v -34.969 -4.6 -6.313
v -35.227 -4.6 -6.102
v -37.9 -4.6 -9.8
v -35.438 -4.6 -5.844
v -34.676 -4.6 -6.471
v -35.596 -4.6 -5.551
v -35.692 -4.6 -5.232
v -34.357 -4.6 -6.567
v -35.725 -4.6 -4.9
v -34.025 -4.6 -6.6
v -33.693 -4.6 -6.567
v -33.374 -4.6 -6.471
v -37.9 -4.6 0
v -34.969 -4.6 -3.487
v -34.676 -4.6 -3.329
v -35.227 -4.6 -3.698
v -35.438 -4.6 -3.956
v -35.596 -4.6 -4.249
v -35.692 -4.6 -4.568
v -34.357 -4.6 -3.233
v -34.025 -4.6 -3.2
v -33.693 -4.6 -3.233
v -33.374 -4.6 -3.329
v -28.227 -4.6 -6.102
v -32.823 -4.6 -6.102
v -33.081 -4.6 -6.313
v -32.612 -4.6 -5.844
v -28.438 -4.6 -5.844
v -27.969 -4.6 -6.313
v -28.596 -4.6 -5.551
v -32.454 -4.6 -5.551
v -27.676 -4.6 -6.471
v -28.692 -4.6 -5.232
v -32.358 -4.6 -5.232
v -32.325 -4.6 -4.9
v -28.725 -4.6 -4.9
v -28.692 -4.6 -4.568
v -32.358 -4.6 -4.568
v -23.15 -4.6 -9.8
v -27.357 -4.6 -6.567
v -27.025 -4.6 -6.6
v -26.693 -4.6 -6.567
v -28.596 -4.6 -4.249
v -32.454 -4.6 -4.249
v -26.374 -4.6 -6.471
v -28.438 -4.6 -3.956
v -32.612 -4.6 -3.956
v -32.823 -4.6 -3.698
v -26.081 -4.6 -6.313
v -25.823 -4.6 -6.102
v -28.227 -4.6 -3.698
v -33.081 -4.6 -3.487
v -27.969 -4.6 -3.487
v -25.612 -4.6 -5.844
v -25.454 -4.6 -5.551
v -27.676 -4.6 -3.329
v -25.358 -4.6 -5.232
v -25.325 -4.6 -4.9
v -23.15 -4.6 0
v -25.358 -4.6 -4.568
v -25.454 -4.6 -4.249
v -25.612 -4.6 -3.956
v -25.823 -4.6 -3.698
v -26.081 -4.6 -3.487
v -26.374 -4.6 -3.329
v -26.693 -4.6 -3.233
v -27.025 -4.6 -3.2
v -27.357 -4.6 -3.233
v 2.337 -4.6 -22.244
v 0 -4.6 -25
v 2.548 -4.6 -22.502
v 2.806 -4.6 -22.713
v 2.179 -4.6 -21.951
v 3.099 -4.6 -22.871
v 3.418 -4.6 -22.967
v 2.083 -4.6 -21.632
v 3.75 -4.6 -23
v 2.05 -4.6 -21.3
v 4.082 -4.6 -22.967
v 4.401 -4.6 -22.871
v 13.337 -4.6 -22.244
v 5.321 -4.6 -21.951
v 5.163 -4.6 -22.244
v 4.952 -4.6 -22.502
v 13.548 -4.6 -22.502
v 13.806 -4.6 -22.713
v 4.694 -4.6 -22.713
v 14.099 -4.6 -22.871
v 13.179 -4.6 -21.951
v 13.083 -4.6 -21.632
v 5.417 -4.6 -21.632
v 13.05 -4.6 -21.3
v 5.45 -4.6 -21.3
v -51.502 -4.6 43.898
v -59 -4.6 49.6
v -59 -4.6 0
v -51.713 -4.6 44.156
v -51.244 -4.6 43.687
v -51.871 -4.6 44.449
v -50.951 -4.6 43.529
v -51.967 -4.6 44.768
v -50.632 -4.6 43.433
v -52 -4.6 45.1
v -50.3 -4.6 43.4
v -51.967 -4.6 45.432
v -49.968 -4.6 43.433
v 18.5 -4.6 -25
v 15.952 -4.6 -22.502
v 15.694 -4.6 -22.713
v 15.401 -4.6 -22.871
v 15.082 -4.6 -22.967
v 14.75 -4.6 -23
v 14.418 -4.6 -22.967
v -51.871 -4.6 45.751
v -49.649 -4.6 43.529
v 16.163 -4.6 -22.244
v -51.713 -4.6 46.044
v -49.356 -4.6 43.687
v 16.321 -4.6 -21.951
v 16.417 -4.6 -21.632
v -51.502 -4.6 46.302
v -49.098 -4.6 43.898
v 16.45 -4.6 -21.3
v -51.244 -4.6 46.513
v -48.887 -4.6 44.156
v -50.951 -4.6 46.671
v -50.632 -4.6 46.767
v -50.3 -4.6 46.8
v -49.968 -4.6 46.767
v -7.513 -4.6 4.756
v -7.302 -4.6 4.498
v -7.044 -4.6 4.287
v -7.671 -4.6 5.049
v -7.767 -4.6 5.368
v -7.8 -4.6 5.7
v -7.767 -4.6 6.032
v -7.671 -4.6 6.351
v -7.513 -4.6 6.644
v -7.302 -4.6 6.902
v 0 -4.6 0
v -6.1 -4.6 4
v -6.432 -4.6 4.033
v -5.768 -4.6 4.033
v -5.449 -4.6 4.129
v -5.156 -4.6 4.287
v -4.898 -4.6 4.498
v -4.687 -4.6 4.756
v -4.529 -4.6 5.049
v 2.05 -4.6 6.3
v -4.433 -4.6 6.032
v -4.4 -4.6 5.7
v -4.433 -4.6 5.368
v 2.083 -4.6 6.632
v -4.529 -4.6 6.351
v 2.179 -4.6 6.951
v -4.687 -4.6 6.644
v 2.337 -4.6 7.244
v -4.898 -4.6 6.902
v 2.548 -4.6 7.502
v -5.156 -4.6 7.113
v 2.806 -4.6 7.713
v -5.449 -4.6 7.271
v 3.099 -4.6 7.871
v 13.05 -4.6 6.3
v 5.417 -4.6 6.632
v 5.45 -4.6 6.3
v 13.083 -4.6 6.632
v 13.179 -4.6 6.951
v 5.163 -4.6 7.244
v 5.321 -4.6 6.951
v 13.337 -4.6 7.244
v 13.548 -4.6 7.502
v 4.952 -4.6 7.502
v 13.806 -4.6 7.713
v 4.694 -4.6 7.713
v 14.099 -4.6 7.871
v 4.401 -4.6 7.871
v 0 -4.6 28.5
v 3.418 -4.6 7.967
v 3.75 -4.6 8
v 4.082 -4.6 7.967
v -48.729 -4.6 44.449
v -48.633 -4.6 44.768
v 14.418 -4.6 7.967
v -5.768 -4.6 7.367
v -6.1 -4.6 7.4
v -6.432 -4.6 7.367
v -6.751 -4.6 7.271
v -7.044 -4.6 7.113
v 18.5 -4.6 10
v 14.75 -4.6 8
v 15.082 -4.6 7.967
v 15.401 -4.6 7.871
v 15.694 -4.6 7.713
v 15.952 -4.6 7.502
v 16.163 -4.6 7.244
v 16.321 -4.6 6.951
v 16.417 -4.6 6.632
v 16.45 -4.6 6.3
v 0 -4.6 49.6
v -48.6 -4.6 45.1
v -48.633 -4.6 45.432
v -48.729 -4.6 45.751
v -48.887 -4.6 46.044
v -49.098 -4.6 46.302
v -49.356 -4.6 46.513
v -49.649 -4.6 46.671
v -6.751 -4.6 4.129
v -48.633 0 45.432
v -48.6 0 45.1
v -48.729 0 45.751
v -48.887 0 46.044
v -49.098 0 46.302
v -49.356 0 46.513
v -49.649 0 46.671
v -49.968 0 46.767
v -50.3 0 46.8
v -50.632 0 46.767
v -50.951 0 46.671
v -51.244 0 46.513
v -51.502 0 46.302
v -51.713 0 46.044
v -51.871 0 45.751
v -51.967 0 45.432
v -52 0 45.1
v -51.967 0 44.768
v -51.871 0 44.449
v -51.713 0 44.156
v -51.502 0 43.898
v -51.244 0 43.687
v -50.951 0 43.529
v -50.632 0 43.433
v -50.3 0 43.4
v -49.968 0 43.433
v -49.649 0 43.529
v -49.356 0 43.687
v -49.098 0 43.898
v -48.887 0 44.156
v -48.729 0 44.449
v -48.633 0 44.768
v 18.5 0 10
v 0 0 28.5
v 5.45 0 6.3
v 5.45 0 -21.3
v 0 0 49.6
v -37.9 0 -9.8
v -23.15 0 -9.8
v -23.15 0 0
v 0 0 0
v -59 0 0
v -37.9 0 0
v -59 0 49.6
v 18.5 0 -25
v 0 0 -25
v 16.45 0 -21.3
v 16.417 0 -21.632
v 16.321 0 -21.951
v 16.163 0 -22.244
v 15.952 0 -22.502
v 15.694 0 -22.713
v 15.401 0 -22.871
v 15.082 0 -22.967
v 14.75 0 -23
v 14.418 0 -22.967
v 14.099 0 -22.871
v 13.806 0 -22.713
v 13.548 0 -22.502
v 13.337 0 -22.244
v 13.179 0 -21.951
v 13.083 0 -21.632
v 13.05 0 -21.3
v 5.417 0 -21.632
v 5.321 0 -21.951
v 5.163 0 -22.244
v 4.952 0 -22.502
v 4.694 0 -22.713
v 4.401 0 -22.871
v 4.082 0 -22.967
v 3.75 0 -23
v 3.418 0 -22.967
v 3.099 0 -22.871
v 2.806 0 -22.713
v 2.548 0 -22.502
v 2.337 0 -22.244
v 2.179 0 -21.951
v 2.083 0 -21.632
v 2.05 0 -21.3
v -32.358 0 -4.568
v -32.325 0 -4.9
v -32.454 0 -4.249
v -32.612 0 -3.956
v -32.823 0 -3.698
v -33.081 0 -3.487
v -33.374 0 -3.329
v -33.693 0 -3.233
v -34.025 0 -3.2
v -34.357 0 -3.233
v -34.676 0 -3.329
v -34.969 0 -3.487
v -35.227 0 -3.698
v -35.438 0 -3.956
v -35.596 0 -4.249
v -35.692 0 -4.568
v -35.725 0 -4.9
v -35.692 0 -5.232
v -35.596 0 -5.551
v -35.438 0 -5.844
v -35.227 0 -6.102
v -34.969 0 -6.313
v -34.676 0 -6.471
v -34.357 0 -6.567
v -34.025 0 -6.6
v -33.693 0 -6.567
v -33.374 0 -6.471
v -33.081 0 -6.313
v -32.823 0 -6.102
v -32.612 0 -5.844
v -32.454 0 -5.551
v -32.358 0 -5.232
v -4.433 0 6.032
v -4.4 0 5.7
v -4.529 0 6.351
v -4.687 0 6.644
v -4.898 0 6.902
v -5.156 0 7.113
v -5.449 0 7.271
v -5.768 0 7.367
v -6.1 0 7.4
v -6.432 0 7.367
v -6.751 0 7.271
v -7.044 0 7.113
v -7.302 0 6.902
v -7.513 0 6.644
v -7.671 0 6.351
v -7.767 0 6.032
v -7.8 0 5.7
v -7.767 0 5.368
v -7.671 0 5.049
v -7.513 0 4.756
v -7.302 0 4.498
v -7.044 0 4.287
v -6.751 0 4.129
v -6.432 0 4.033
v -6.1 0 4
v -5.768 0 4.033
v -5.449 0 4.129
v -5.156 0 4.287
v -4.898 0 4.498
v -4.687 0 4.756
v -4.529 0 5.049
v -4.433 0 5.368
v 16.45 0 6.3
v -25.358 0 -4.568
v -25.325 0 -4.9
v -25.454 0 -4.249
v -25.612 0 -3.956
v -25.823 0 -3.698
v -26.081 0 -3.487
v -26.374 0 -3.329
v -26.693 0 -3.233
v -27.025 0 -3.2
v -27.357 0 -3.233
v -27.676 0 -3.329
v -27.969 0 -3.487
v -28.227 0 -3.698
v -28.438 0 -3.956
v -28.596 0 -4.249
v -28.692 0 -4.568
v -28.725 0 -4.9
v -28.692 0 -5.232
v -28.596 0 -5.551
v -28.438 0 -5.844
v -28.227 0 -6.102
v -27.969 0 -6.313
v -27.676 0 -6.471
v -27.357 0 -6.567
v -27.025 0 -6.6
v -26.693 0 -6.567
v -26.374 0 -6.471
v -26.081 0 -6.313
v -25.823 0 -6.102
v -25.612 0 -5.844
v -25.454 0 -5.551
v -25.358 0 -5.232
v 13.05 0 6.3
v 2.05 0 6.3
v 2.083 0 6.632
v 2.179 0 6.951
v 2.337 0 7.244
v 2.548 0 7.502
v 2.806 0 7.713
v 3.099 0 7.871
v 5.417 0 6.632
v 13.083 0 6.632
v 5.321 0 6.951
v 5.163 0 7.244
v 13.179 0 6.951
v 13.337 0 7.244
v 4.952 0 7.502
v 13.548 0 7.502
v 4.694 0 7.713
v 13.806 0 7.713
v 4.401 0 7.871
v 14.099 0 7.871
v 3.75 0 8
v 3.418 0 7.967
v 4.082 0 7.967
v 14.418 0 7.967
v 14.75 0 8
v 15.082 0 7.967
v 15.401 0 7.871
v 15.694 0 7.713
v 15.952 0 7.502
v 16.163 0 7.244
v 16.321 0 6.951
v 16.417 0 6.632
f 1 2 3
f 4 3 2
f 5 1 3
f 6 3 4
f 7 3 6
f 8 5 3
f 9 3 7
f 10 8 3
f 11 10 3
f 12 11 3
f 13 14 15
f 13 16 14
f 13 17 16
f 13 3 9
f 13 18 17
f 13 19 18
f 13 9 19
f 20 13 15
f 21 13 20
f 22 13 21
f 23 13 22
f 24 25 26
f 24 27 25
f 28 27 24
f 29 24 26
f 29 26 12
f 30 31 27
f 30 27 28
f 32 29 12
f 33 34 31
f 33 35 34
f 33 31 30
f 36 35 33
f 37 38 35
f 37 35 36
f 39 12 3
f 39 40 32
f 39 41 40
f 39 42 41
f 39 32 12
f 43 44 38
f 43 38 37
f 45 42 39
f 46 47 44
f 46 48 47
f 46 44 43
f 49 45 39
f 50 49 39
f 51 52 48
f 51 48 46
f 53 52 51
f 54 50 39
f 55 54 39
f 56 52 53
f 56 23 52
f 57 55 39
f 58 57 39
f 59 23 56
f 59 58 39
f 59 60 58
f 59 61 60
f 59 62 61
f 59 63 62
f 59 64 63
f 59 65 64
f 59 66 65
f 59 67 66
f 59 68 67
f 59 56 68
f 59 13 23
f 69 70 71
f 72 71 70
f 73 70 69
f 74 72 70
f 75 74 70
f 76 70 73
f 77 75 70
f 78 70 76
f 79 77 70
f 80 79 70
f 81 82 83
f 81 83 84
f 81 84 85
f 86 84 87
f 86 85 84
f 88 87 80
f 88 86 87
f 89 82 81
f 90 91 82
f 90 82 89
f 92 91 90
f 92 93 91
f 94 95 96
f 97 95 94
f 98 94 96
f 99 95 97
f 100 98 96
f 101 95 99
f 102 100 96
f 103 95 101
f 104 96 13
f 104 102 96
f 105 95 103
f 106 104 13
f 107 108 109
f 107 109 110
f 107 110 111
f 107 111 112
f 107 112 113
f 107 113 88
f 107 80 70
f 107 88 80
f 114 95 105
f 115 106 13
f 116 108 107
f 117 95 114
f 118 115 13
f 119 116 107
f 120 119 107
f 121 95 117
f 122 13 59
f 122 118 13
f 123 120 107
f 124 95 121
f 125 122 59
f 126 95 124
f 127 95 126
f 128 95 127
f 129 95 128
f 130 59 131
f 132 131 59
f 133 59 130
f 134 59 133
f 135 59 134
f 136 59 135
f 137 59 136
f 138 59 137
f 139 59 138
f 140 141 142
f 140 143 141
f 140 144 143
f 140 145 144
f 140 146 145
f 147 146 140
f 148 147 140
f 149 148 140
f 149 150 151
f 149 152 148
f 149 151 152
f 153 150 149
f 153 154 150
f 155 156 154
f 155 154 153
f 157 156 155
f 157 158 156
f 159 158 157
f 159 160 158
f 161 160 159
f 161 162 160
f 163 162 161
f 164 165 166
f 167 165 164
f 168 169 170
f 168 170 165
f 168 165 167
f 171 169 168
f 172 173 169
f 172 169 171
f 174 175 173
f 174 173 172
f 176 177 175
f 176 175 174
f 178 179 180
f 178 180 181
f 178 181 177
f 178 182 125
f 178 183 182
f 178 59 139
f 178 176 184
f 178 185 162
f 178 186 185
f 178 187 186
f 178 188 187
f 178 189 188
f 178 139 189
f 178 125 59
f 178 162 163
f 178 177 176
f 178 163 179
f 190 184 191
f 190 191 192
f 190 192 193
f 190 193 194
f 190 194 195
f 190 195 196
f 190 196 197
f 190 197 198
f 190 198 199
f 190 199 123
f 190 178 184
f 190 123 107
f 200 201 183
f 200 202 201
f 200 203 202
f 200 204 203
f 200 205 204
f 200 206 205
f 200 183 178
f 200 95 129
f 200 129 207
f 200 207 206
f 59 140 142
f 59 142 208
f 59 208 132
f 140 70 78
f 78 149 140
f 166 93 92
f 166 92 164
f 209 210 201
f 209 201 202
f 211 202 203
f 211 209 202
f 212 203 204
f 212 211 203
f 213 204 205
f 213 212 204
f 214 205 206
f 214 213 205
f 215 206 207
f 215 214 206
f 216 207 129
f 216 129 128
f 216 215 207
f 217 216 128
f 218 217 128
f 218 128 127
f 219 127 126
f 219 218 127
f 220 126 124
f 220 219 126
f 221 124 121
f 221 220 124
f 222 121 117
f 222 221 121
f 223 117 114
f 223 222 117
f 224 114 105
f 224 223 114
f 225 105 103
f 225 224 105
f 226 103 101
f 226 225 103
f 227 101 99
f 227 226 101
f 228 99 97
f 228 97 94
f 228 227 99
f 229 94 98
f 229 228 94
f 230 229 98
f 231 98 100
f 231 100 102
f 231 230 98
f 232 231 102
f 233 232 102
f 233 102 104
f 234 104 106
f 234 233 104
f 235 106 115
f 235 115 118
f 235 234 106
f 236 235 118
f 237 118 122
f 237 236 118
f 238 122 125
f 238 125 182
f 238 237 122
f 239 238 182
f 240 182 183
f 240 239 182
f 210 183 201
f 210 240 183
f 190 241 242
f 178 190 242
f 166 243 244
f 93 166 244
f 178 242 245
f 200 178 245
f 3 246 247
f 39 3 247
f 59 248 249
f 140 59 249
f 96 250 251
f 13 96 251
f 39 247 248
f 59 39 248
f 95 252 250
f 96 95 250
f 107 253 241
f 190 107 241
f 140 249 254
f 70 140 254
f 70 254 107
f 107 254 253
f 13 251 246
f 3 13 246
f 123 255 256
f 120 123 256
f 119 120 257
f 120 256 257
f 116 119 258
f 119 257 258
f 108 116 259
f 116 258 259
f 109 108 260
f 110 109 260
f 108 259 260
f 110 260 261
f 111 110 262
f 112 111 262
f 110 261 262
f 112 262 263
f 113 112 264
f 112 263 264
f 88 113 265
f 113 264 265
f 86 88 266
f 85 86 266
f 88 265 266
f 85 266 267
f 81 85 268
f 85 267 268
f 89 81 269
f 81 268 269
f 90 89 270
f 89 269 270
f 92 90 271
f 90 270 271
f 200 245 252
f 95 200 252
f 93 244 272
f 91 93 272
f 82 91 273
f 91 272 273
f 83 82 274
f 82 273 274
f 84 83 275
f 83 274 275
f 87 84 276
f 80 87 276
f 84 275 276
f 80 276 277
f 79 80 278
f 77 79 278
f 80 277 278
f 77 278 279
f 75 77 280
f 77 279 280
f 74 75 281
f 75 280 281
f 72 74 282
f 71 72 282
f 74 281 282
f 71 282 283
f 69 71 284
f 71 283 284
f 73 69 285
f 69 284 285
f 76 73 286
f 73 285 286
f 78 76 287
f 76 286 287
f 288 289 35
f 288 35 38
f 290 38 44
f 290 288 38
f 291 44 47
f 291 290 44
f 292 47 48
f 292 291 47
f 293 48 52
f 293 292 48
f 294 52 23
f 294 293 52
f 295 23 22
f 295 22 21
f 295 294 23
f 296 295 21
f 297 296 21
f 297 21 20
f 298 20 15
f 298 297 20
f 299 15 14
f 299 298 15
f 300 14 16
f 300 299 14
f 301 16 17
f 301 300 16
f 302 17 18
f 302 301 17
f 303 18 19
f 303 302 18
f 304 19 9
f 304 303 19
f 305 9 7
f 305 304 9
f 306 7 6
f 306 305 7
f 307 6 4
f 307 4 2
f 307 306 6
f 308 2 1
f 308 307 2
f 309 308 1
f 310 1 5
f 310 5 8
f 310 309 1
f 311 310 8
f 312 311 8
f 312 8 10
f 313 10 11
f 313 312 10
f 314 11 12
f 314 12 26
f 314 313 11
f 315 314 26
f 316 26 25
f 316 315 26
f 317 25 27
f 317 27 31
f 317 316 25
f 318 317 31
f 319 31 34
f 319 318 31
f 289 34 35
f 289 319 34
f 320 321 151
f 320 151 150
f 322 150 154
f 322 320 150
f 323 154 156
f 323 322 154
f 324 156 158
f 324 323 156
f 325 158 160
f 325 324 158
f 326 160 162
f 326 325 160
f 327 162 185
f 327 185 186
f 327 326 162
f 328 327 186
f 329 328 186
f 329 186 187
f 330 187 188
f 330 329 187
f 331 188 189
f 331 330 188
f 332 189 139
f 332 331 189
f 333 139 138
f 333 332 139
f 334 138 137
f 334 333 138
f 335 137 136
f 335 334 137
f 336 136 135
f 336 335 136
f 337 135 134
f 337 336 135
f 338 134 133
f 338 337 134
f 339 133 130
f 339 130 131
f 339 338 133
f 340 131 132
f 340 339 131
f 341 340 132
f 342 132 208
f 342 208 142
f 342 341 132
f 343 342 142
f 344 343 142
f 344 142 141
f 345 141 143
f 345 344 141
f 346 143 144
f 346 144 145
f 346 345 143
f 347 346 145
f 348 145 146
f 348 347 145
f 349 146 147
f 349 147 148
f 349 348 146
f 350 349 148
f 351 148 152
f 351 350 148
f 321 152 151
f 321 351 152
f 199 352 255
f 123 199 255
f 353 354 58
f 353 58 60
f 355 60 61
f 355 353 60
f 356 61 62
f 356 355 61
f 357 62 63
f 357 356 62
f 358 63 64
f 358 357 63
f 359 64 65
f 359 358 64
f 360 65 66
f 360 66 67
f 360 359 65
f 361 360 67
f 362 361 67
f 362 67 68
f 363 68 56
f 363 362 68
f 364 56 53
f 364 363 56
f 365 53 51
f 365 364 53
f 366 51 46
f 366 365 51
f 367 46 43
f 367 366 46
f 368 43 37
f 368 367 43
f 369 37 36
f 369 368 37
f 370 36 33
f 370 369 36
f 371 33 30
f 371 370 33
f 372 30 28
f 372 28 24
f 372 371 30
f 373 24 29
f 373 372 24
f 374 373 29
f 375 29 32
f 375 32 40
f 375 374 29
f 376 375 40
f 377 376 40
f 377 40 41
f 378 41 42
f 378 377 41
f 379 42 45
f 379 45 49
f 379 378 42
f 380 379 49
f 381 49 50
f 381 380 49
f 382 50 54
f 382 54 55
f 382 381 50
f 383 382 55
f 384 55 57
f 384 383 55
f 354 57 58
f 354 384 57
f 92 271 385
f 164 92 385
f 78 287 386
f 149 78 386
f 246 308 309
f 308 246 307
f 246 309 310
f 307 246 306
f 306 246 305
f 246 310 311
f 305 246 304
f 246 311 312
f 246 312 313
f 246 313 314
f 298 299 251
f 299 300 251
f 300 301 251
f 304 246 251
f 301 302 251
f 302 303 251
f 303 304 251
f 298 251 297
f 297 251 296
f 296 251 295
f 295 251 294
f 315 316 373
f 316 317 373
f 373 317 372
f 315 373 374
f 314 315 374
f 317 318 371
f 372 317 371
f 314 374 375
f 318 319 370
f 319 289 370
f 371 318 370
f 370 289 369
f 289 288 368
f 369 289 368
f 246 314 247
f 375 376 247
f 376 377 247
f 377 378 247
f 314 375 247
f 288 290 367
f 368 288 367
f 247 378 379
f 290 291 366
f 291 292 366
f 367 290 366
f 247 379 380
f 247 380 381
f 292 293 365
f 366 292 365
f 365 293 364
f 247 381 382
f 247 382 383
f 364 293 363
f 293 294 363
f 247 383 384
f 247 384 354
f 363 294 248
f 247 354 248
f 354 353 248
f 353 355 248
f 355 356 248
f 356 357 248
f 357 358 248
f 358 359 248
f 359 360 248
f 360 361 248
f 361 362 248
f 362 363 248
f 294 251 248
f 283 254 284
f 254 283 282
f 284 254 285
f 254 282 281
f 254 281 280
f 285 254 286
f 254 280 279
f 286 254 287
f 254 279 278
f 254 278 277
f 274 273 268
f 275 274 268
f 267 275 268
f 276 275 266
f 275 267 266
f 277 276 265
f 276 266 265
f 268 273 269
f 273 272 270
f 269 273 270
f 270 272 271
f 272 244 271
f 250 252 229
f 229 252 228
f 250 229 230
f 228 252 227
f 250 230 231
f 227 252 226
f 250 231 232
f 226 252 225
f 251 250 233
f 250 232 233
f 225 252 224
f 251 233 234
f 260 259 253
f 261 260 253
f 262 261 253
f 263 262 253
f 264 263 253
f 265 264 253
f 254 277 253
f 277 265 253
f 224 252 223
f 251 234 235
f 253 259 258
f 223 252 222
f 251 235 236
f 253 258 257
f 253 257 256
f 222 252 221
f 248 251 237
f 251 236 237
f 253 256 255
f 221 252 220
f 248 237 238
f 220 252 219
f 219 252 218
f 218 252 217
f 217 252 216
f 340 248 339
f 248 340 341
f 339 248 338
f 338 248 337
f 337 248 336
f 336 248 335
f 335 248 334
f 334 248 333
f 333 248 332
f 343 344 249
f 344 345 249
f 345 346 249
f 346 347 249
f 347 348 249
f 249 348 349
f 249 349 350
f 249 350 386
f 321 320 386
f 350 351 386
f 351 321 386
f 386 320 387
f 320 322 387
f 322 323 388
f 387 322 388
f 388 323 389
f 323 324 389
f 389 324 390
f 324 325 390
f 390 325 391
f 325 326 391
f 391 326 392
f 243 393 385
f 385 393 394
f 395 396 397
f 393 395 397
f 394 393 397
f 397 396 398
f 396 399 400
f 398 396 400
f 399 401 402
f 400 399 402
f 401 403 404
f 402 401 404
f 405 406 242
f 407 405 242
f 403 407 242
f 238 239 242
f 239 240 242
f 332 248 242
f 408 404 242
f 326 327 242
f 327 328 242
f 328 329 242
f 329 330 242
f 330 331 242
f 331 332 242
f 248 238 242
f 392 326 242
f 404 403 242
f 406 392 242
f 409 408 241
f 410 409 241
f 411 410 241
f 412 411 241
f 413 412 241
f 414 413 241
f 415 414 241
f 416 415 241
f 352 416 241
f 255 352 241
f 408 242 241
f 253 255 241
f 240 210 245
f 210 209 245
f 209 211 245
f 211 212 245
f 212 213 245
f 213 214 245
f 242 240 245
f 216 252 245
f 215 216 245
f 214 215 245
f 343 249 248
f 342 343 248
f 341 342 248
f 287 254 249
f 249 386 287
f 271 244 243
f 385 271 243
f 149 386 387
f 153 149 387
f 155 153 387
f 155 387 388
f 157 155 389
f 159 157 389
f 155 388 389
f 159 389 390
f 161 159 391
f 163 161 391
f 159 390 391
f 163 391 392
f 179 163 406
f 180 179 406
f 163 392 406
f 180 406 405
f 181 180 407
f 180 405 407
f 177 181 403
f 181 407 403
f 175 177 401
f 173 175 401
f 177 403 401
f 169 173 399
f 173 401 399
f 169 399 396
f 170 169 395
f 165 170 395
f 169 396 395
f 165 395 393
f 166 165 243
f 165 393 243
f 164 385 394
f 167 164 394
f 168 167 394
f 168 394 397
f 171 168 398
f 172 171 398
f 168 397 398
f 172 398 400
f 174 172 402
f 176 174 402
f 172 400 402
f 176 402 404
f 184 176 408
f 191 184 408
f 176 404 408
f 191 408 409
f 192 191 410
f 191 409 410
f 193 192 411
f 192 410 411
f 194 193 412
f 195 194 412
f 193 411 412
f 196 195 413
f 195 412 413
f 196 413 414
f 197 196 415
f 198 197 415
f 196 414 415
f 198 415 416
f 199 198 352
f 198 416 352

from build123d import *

# Parameters (mm, degrees)
F0_R     = 1.7
F1_DEPTH = 4.6


with BuildPart() as f1:
    # F0 (on Front) → F1 (new body)
    with BuildSketch(Plane.XZ):
        Polygon((0, 49.6), (-59, 49.6), (-59, 0), (-37.9, 0), (-37.9, -9.8), (-23.15, -9.8), (-23.15, 0), (0, 0), (0, -25), (18.5, -25), (18.5, 10), (0, 28.5), align=None)
        with Locations((-34.025, -4.9)):
            Circle(F0_R, mode=Mode.SUBTRACT)
        with Locations((-27.025, -4.9)):
            Circle(F0_R, mode=Mode.SUBTRACT)
        with BuildLine():
            Line((2.05, -21.3), (2.05, 6.3))
            ThreePointArc((2.05, 6.3), (3.75, 8), (5.45, 6.3))
            Line((5.45, 6.3), (5.45, -21.3))
            ThreePointArc((5.45, -21.3), (3.75, -23), (2.05, -21.3))
        make_face(mode=Mode.SUBTRACT)
        with BuildLine():
            Line((16.45, 6.3), (16.45, -21.3))
            ThreePointArc((16.45, -21.3), (14.75, -23), (13.05, -21.3))
            Line((13.05, -21.3), (13.05, 6.3))
            ThreePointArc((13.05, 6.3), (14.75, 8), (16.45, 6.3))
        make_face(mode=Mode.SUBTRACT)
        with Locations((-6.1, 5.7)):
            Circle(F0_R, mode=Mode.SUBTRACT)
        with Locations((-50.3, 45.1)):
            Circle(F0_R, mode=Mode.SUBTRACT)
    extrude(amount=F1_DEPTH)


solid = f1.part
